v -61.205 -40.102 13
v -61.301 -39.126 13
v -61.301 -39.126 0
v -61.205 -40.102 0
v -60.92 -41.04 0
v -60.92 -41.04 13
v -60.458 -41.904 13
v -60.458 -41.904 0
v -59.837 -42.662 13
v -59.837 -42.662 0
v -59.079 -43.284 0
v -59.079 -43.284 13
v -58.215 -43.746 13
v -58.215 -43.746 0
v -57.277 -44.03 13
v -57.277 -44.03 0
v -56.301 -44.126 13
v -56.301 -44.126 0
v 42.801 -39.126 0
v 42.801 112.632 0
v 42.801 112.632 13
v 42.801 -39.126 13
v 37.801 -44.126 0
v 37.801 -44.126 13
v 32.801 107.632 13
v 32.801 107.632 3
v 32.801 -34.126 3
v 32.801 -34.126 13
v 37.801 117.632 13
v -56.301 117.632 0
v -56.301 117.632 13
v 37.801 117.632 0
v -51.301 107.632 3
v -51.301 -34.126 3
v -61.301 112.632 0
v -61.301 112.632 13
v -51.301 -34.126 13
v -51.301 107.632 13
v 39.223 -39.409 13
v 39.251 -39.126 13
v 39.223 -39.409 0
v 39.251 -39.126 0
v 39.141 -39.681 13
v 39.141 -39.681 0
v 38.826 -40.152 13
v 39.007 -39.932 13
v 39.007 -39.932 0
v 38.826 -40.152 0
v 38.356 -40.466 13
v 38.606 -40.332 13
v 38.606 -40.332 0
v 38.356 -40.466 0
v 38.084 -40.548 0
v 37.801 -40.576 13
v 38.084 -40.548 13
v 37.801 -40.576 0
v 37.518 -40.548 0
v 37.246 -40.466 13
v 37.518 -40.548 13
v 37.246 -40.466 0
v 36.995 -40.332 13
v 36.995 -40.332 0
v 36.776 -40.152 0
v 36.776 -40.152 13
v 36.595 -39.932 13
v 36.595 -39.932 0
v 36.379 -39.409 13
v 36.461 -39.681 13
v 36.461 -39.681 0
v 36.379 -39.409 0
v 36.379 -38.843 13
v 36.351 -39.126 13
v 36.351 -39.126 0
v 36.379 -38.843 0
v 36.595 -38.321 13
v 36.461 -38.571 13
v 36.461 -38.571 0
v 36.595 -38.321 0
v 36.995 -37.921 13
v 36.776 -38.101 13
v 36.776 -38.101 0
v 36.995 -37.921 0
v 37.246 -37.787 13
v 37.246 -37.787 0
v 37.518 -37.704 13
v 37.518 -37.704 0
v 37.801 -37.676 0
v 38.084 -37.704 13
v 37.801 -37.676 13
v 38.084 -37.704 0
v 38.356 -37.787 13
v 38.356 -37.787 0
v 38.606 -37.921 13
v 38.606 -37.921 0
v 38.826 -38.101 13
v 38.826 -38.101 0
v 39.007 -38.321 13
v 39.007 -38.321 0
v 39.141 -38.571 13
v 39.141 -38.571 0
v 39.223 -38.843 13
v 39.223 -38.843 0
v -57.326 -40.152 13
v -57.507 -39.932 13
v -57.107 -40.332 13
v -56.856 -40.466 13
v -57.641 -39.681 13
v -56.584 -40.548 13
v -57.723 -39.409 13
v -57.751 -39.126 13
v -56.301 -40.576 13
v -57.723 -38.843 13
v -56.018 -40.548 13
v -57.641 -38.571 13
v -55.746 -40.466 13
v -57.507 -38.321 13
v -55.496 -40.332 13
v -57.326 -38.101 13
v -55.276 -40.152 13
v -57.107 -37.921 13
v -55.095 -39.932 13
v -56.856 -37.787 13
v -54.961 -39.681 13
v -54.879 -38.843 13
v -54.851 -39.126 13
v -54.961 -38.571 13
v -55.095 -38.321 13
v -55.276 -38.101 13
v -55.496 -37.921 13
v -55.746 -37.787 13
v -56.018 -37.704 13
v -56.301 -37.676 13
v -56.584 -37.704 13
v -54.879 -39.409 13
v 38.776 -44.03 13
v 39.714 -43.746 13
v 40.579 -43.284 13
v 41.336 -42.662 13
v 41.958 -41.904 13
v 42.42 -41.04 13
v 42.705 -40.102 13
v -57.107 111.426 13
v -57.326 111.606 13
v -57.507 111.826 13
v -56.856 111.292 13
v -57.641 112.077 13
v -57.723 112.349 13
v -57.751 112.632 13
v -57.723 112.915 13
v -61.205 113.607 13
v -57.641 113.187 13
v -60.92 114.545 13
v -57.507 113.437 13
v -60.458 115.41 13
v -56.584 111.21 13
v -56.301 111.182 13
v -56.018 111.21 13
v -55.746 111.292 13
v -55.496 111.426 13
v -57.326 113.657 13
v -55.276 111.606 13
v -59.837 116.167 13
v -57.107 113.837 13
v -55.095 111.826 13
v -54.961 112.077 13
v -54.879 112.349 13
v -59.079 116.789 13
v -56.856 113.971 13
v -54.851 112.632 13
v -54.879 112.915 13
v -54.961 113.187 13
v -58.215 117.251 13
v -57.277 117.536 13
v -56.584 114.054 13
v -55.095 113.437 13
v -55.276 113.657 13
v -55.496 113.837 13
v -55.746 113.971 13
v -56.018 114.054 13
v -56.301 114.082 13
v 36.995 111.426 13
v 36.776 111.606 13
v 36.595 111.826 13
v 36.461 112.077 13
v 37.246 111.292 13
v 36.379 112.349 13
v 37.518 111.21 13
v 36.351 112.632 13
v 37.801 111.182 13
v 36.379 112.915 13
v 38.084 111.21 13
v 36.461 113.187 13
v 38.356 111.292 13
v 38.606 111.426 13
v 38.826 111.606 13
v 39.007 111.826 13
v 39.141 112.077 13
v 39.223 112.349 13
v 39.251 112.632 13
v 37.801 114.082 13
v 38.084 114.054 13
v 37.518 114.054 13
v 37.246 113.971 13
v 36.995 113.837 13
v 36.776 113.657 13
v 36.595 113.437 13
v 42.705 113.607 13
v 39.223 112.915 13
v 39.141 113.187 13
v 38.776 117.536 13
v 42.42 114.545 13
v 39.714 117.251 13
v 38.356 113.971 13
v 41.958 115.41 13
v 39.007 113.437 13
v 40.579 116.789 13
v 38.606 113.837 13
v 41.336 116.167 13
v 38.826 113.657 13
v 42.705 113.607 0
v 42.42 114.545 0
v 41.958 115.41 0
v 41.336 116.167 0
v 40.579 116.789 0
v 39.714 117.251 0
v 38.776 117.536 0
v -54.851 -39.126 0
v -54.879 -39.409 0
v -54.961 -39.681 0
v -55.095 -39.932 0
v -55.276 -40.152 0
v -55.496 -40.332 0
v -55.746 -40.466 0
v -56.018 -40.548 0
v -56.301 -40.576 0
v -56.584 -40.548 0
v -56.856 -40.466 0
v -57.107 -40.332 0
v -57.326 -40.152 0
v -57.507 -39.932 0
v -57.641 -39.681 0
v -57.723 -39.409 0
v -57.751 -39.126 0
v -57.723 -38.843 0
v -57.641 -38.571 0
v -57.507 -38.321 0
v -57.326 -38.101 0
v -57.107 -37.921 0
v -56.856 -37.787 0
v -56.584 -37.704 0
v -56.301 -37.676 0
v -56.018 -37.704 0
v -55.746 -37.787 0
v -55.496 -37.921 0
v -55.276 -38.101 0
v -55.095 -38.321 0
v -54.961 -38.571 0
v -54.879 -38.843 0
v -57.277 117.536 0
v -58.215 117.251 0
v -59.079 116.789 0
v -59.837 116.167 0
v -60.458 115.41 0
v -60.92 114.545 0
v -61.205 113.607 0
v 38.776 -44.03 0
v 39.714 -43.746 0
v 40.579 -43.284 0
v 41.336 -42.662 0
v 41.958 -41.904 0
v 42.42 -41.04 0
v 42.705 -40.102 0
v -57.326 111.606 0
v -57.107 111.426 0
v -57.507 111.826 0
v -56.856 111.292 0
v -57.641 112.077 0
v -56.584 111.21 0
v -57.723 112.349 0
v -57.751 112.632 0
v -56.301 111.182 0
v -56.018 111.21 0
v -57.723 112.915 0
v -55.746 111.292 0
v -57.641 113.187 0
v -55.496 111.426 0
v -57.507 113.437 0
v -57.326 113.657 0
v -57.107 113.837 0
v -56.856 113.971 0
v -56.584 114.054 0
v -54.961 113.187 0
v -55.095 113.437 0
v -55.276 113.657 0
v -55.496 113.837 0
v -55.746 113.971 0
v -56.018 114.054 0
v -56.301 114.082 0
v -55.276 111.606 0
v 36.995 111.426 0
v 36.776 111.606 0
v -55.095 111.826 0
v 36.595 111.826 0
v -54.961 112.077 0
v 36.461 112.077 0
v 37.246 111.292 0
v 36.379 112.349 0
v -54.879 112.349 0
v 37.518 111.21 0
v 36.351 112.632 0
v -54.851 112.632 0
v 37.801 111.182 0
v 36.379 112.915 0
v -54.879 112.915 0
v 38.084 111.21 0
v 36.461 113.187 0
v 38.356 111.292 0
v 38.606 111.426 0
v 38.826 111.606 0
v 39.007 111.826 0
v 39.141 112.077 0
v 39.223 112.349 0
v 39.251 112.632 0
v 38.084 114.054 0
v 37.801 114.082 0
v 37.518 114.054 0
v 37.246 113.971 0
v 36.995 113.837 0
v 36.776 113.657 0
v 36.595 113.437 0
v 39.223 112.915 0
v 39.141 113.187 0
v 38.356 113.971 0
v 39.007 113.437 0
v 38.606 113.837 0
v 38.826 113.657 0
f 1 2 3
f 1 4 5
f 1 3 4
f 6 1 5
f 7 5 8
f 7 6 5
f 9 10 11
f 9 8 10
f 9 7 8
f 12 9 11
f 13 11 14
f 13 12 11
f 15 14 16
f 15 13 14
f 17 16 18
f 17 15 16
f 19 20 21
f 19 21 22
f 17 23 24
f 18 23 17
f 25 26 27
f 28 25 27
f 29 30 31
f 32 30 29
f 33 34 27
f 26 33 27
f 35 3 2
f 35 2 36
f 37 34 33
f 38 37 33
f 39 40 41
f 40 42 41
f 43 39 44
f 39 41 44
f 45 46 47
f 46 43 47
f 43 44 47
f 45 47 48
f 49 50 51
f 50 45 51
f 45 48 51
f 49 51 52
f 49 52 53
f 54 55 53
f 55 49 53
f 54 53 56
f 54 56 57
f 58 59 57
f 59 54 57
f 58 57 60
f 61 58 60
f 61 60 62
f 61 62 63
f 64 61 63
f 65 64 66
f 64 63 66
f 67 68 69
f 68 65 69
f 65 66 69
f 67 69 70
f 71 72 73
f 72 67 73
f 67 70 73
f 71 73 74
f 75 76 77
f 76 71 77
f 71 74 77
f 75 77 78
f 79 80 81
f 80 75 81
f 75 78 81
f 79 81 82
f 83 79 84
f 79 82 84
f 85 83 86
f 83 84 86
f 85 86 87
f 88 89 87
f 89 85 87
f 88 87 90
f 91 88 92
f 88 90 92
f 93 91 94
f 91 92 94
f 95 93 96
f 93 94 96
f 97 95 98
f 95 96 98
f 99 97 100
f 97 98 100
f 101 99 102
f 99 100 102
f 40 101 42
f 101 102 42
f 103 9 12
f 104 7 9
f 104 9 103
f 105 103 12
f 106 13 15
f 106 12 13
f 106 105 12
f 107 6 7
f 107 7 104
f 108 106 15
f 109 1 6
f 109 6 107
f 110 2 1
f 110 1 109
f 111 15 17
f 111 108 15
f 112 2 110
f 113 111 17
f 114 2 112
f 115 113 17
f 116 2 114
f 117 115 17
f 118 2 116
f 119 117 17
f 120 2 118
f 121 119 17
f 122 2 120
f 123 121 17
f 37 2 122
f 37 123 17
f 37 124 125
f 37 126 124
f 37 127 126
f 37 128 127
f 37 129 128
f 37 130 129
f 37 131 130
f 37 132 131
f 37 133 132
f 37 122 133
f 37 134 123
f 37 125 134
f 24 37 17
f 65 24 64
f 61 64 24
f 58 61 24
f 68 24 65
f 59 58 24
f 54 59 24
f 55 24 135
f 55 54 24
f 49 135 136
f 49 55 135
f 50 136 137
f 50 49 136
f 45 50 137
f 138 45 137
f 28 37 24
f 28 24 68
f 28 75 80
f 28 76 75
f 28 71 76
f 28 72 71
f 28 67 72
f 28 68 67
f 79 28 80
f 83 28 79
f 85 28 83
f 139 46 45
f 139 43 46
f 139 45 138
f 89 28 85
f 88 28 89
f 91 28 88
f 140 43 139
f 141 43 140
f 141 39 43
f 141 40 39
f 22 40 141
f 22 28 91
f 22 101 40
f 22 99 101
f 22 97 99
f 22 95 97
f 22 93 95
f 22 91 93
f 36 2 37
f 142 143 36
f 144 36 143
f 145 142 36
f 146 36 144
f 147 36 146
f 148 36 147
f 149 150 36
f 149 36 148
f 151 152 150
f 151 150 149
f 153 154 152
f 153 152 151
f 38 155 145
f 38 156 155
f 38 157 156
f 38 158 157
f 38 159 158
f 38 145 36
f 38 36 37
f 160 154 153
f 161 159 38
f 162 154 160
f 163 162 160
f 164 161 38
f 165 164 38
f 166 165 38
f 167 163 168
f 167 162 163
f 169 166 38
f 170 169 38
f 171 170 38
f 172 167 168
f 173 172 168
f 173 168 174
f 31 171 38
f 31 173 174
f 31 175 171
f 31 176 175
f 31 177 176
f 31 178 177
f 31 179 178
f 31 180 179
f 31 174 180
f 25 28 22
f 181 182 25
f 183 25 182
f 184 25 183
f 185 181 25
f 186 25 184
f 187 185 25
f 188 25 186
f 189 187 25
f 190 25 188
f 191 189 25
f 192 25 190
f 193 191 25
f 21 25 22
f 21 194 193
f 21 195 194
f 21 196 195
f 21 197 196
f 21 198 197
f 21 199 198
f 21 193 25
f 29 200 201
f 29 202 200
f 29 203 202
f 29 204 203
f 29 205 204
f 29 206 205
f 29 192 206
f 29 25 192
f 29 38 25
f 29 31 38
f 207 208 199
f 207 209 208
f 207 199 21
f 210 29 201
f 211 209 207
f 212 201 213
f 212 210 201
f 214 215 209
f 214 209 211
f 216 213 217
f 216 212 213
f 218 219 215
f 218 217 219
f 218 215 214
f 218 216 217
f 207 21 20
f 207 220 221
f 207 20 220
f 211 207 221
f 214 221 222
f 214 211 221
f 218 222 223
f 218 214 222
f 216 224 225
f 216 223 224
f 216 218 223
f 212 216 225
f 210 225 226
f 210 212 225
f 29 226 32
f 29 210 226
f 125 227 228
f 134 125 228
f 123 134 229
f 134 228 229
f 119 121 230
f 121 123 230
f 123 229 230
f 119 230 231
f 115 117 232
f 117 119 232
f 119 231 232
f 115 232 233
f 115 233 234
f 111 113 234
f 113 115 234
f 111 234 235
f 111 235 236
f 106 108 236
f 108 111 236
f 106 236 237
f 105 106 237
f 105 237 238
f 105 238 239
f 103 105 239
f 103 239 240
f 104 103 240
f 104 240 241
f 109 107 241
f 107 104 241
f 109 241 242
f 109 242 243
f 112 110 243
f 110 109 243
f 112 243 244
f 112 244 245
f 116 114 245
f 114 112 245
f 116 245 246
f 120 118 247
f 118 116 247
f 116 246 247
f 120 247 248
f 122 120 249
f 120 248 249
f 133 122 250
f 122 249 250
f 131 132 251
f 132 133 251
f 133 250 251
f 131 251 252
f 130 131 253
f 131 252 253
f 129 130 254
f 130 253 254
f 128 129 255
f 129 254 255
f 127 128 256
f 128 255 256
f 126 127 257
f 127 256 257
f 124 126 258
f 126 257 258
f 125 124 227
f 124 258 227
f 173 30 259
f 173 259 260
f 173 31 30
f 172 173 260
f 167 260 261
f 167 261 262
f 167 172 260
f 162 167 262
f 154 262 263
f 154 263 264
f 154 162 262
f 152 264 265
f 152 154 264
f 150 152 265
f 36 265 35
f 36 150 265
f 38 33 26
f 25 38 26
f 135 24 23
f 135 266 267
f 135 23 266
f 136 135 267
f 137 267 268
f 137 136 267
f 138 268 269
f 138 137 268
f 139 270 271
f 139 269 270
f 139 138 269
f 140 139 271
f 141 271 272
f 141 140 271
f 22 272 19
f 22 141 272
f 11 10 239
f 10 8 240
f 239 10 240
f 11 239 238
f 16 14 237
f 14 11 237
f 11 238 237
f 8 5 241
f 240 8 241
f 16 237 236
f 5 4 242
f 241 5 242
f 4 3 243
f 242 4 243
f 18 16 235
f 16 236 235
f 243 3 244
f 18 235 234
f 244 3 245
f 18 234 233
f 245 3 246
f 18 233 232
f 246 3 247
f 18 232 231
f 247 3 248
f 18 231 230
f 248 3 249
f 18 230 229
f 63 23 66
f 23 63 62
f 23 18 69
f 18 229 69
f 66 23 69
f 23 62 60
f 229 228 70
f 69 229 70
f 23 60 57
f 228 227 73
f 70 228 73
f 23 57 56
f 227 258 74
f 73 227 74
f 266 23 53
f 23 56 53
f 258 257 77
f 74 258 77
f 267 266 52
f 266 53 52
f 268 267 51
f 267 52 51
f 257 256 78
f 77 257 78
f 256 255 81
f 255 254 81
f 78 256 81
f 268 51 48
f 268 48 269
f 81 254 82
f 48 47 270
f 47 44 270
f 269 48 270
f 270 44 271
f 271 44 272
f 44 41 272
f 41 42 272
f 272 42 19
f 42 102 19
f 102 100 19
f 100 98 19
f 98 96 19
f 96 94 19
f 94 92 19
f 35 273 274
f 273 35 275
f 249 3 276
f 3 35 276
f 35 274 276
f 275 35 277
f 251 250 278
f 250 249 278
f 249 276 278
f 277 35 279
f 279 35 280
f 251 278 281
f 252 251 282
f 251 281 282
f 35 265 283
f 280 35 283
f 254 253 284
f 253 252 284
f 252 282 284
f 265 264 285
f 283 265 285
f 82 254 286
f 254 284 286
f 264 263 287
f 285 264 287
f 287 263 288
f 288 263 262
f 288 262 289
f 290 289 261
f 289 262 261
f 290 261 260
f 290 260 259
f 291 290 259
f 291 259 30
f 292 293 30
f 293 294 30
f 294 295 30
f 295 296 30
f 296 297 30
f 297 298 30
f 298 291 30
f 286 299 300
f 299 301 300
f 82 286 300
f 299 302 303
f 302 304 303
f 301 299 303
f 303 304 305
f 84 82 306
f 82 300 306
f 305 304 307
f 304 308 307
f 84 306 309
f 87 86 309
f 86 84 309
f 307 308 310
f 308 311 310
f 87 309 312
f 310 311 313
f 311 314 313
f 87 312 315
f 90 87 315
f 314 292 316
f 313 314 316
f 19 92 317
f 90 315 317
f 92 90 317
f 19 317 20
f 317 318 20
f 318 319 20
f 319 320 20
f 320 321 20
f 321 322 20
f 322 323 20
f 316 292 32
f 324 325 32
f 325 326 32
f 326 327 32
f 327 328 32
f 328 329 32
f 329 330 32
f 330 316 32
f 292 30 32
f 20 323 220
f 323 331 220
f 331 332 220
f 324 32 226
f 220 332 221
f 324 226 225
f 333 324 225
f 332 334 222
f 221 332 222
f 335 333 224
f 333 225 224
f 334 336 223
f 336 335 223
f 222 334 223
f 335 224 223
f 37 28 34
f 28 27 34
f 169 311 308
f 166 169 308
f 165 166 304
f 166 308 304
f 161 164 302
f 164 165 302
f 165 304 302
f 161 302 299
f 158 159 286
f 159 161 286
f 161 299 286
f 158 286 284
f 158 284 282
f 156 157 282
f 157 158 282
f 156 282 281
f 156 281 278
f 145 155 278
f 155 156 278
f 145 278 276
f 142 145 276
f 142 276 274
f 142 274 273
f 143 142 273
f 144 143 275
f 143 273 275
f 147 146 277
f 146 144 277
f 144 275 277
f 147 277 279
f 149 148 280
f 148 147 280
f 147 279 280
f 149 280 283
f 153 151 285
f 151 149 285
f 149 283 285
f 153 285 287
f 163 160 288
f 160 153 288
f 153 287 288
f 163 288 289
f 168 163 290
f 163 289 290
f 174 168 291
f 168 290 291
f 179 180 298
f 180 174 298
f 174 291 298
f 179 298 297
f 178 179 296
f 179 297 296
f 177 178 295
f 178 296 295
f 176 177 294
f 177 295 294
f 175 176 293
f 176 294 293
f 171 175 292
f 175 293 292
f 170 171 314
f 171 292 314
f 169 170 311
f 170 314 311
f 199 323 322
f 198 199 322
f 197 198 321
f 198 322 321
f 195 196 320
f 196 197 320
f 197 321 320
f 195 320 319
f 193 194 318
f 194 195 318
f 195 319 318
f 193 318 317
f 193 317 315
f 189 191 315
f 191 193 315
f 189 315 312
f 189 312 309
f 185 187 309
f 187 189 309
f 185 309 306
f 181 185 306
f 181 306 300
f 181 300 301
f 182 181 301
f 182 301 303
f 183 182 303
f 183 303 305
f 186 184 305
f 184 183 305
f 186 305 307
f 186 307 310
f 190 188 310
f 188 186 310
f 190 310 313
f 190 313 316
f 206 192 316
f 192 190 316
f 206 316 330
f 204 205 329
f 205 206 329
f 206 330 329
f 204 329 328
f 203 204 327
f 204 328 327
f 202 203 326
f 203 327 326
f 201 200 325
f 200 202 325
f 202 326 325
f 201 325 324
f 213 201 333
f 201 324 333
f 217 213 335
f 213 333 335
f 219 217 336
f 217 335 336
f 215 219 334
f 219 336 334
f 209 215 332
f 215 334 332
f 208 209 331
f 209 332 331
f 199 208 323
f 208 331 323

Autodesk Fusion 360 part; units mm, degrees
sketch "Sketch1" plane through (0, 0, 0) normal (0, 0, 1) x (1, 0, 0)
  line L0 (-51.3011, 107.6317) -> (32.8009, 107.6317)
  line L1 (32.8009, 107.6317) -> (32.8009, -34.1263)
  line L2 (32.8009, -34.1263) -> (-51.3011, -34.1263)
  line L3 (-51.3011, -34.1263) -> (-51.3011, 107.6317)
  line L4 (-61.3011, 117.6317) -> (42.8009, 117.6317)
  line L5 (42.8009, 117.6317) -> (42.8009, -44.1263)
  line L6 (42.8009, -44.1263) -> (-61.3011, -44.1263)
  line L7 (-61.3011, -44.1263) -> (-61.3011, 117.6317)
  circle A0 centre (37.8009, 112.6317) radius 1.45
  circle A1 centre (37.8009, -39.1263) radius 1.45
  circle A2 centre (-56.3011, -39.1263) radius 1.45
  circle A3 centre (-56.3011, 112.6317) radius 1.45
  dimension "d1" = 84.102
  dimension "d2" = 141.758
  dimension "d3" = 104.102
  dimension "d4" = 161.758
  dimension "d5" = 10
  dimension "d6" = 10
  dimension "d7" = 2.9
  dimension "d8" = 5
  dimension "d9" = 5
  dimension "d10" = 2.9
  dimension "d11" = 5
  dimension "d12" = 5
  dimension "d13" = 2.9
  dimension "d14" = 5
  dimension "d15" = 5
  dimension "d16" = 2.9
  dimension "d17" = 5
  dimension "d18" = 5
extrude "Extrude1" add sketch "Sketch1" along normal blind 3 contours L0 L1 L2 L3
extrude "Extrude2" add sketch "Sketch1" along normal blind 13
fillet "Fillet1" radius 5 4 edges at (42.8009, -44.1263, 6.5) (42.8009, 117.6317, 6.5) (-61.3011, 117.6317, 6.5) (-61.3011, -44.1263, 6.5)
